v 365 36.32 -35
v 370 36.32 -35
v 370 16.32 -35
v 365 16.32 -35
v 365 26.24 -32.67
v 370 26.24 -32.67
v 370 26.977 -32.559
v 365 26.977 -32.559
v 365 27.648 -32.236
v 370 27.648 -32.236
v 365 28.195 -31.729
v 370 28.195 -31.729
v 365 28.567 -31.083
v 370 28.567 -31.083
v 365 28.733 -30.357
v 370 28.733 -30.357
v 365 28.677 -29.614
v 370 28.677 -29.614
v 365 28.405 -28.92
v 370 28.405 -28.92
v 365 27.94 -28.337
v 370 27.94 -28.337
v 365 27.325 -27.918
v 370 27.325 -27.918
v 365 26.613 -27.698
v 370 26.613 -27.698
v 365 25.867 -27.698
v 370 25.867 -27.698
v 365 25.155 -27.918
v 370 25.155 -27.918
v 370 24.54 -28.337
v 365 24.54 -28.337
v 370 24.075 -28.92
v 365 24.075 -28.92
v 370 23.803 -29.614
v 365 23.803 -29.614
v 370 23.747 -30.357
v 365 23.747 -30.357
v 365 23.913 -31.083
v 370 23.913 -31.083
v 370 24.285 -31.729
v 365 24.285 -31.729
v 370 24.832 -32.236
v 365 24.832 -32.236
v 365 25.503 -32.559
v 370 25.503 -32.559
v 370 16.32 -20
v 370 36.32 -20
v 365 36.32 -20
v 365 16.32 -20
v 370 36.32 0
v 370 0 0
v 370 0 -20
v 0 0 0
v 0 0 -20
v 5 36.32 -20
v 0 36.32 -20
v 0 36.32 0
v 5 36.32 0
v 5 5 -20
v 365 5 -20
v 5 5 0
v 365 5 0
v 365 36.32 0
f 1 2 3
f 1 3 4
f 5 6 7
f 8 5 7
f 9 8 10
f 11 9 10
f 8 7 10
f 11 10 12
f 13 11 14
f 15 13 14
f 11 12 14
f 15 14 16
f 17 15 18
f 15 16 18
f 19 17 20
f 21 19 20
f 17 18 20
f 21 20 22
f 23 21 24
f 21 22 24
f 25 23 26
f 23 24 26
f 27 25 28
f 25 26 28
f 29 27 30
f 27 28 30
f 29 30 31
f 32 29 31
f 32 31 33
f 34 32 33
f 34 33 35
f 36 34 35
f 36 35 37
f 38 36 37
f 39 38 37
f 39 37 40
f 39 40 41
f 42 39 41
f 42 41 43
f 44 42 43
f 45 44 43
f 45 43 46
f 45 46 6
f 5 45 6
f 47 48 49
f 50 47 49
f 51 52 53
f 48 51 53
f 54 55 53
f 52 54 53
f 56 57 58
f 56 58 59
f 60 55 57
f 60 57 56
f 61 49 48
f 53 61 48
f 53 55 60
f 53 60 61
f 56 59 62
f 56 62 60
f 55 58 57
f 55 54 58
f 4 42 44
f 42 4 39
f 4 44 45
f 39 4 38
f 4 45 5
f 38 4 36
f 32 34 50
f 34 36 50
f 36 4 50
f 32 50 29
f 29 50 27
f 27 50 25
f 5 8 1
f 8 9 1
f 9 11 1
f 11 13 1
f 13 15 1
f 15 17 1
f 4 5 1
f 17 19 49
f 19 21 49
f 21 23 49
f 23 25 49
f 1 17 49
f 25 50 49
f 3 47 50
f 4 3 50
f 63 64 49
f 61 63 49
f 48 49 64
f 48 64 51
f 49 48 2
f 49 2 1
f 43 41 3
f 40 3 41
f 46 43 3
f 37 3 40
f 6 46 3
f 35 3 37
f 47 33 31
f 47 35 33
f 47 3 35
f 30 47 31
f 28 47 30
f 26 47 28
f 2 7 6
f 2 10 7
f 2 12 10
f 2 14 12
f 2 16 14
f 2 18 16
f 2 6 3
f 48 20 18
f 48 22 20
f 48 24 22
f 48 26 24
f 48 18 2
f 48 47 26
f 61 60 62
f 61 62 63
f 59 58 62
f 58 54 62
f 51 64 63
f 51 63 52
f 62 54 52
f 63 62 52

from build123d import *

# Parameters (mm, degrees)
SKETCH1_W           = 370
SKETCH1_H           = 20
BOSS_EXTRUDE1_DEPTH = 5
SKETCH2_W           = 5
SKETCH2_H           = 20
BOSS_EXTRUDE2_DEPTH = 31.32
SKETCH3_W           = 5
SKETCH3_H           = 20
BOSS_EXTRUDE3_DEPTH = 15
SKETCH4_R           = 2.5
CUT_EXTRUDE1_DEPTH  = 15


with BuildPart() as part:
    # Sketch1 → Boss-Extrude1 (new body)
    with BuildSketch(Plane(origin=(0, 0, 0), x_dir=(1, 0, 0), z_dir=(0, 1, 0))):
        with Locations((185, 10)):
            Rectangle(SKETCH1_W, SKETCH1_H)
    extrude(amount=BOSS_EXTRUDE1_DEPTH)

    # Sketch2 → Boss-Extrude2 (add)
    with BuildSketch(Plane(origin=(0, 5, 0), x_dir=(1, 0, 0), z_dir=(0, 1, 0))):
        with Locations((2.5, 10)):
            Rectangle(SKETCH2_W, SKETCH2_H)
        with Locations((367.5, 10)):
            Rectangle(SKETCH2_W, SKETCH2_H)
    extrude(amount=BOSS_EXTRUDE2_DEPTH)


with BuildPart() as body_2:
    # Sketch3 → Boss-Extrude3 (new body)
    with BuildSketch(Plane(origin=(0, 0, -20), x_dir=(-1, 0, 0), z_dir=(0, 0, -1))):
        with Locations((-367.5, 26.32)):
            Rectangle(SKETCH3_W, SKETCH3_H)
    extrude(amount=BOSS_EXTRUDE3_DEPTH)

    # Sketch4 → Cut-Extrude1 (cut)
    with BuildSketch(Plane(origin=(370, 0, 0), x_dir=(0, 0, -1), z_dir=(1, 0, 0))):
        with Locations((30.17, 26.24)):
            Circle(SKETCH4_R)
    extrude(amount=-CUT_EXTRUDE1_DEPTH, mode=Mode.SUBTRACT)


solid = Compound([part.part, body_2.part])
